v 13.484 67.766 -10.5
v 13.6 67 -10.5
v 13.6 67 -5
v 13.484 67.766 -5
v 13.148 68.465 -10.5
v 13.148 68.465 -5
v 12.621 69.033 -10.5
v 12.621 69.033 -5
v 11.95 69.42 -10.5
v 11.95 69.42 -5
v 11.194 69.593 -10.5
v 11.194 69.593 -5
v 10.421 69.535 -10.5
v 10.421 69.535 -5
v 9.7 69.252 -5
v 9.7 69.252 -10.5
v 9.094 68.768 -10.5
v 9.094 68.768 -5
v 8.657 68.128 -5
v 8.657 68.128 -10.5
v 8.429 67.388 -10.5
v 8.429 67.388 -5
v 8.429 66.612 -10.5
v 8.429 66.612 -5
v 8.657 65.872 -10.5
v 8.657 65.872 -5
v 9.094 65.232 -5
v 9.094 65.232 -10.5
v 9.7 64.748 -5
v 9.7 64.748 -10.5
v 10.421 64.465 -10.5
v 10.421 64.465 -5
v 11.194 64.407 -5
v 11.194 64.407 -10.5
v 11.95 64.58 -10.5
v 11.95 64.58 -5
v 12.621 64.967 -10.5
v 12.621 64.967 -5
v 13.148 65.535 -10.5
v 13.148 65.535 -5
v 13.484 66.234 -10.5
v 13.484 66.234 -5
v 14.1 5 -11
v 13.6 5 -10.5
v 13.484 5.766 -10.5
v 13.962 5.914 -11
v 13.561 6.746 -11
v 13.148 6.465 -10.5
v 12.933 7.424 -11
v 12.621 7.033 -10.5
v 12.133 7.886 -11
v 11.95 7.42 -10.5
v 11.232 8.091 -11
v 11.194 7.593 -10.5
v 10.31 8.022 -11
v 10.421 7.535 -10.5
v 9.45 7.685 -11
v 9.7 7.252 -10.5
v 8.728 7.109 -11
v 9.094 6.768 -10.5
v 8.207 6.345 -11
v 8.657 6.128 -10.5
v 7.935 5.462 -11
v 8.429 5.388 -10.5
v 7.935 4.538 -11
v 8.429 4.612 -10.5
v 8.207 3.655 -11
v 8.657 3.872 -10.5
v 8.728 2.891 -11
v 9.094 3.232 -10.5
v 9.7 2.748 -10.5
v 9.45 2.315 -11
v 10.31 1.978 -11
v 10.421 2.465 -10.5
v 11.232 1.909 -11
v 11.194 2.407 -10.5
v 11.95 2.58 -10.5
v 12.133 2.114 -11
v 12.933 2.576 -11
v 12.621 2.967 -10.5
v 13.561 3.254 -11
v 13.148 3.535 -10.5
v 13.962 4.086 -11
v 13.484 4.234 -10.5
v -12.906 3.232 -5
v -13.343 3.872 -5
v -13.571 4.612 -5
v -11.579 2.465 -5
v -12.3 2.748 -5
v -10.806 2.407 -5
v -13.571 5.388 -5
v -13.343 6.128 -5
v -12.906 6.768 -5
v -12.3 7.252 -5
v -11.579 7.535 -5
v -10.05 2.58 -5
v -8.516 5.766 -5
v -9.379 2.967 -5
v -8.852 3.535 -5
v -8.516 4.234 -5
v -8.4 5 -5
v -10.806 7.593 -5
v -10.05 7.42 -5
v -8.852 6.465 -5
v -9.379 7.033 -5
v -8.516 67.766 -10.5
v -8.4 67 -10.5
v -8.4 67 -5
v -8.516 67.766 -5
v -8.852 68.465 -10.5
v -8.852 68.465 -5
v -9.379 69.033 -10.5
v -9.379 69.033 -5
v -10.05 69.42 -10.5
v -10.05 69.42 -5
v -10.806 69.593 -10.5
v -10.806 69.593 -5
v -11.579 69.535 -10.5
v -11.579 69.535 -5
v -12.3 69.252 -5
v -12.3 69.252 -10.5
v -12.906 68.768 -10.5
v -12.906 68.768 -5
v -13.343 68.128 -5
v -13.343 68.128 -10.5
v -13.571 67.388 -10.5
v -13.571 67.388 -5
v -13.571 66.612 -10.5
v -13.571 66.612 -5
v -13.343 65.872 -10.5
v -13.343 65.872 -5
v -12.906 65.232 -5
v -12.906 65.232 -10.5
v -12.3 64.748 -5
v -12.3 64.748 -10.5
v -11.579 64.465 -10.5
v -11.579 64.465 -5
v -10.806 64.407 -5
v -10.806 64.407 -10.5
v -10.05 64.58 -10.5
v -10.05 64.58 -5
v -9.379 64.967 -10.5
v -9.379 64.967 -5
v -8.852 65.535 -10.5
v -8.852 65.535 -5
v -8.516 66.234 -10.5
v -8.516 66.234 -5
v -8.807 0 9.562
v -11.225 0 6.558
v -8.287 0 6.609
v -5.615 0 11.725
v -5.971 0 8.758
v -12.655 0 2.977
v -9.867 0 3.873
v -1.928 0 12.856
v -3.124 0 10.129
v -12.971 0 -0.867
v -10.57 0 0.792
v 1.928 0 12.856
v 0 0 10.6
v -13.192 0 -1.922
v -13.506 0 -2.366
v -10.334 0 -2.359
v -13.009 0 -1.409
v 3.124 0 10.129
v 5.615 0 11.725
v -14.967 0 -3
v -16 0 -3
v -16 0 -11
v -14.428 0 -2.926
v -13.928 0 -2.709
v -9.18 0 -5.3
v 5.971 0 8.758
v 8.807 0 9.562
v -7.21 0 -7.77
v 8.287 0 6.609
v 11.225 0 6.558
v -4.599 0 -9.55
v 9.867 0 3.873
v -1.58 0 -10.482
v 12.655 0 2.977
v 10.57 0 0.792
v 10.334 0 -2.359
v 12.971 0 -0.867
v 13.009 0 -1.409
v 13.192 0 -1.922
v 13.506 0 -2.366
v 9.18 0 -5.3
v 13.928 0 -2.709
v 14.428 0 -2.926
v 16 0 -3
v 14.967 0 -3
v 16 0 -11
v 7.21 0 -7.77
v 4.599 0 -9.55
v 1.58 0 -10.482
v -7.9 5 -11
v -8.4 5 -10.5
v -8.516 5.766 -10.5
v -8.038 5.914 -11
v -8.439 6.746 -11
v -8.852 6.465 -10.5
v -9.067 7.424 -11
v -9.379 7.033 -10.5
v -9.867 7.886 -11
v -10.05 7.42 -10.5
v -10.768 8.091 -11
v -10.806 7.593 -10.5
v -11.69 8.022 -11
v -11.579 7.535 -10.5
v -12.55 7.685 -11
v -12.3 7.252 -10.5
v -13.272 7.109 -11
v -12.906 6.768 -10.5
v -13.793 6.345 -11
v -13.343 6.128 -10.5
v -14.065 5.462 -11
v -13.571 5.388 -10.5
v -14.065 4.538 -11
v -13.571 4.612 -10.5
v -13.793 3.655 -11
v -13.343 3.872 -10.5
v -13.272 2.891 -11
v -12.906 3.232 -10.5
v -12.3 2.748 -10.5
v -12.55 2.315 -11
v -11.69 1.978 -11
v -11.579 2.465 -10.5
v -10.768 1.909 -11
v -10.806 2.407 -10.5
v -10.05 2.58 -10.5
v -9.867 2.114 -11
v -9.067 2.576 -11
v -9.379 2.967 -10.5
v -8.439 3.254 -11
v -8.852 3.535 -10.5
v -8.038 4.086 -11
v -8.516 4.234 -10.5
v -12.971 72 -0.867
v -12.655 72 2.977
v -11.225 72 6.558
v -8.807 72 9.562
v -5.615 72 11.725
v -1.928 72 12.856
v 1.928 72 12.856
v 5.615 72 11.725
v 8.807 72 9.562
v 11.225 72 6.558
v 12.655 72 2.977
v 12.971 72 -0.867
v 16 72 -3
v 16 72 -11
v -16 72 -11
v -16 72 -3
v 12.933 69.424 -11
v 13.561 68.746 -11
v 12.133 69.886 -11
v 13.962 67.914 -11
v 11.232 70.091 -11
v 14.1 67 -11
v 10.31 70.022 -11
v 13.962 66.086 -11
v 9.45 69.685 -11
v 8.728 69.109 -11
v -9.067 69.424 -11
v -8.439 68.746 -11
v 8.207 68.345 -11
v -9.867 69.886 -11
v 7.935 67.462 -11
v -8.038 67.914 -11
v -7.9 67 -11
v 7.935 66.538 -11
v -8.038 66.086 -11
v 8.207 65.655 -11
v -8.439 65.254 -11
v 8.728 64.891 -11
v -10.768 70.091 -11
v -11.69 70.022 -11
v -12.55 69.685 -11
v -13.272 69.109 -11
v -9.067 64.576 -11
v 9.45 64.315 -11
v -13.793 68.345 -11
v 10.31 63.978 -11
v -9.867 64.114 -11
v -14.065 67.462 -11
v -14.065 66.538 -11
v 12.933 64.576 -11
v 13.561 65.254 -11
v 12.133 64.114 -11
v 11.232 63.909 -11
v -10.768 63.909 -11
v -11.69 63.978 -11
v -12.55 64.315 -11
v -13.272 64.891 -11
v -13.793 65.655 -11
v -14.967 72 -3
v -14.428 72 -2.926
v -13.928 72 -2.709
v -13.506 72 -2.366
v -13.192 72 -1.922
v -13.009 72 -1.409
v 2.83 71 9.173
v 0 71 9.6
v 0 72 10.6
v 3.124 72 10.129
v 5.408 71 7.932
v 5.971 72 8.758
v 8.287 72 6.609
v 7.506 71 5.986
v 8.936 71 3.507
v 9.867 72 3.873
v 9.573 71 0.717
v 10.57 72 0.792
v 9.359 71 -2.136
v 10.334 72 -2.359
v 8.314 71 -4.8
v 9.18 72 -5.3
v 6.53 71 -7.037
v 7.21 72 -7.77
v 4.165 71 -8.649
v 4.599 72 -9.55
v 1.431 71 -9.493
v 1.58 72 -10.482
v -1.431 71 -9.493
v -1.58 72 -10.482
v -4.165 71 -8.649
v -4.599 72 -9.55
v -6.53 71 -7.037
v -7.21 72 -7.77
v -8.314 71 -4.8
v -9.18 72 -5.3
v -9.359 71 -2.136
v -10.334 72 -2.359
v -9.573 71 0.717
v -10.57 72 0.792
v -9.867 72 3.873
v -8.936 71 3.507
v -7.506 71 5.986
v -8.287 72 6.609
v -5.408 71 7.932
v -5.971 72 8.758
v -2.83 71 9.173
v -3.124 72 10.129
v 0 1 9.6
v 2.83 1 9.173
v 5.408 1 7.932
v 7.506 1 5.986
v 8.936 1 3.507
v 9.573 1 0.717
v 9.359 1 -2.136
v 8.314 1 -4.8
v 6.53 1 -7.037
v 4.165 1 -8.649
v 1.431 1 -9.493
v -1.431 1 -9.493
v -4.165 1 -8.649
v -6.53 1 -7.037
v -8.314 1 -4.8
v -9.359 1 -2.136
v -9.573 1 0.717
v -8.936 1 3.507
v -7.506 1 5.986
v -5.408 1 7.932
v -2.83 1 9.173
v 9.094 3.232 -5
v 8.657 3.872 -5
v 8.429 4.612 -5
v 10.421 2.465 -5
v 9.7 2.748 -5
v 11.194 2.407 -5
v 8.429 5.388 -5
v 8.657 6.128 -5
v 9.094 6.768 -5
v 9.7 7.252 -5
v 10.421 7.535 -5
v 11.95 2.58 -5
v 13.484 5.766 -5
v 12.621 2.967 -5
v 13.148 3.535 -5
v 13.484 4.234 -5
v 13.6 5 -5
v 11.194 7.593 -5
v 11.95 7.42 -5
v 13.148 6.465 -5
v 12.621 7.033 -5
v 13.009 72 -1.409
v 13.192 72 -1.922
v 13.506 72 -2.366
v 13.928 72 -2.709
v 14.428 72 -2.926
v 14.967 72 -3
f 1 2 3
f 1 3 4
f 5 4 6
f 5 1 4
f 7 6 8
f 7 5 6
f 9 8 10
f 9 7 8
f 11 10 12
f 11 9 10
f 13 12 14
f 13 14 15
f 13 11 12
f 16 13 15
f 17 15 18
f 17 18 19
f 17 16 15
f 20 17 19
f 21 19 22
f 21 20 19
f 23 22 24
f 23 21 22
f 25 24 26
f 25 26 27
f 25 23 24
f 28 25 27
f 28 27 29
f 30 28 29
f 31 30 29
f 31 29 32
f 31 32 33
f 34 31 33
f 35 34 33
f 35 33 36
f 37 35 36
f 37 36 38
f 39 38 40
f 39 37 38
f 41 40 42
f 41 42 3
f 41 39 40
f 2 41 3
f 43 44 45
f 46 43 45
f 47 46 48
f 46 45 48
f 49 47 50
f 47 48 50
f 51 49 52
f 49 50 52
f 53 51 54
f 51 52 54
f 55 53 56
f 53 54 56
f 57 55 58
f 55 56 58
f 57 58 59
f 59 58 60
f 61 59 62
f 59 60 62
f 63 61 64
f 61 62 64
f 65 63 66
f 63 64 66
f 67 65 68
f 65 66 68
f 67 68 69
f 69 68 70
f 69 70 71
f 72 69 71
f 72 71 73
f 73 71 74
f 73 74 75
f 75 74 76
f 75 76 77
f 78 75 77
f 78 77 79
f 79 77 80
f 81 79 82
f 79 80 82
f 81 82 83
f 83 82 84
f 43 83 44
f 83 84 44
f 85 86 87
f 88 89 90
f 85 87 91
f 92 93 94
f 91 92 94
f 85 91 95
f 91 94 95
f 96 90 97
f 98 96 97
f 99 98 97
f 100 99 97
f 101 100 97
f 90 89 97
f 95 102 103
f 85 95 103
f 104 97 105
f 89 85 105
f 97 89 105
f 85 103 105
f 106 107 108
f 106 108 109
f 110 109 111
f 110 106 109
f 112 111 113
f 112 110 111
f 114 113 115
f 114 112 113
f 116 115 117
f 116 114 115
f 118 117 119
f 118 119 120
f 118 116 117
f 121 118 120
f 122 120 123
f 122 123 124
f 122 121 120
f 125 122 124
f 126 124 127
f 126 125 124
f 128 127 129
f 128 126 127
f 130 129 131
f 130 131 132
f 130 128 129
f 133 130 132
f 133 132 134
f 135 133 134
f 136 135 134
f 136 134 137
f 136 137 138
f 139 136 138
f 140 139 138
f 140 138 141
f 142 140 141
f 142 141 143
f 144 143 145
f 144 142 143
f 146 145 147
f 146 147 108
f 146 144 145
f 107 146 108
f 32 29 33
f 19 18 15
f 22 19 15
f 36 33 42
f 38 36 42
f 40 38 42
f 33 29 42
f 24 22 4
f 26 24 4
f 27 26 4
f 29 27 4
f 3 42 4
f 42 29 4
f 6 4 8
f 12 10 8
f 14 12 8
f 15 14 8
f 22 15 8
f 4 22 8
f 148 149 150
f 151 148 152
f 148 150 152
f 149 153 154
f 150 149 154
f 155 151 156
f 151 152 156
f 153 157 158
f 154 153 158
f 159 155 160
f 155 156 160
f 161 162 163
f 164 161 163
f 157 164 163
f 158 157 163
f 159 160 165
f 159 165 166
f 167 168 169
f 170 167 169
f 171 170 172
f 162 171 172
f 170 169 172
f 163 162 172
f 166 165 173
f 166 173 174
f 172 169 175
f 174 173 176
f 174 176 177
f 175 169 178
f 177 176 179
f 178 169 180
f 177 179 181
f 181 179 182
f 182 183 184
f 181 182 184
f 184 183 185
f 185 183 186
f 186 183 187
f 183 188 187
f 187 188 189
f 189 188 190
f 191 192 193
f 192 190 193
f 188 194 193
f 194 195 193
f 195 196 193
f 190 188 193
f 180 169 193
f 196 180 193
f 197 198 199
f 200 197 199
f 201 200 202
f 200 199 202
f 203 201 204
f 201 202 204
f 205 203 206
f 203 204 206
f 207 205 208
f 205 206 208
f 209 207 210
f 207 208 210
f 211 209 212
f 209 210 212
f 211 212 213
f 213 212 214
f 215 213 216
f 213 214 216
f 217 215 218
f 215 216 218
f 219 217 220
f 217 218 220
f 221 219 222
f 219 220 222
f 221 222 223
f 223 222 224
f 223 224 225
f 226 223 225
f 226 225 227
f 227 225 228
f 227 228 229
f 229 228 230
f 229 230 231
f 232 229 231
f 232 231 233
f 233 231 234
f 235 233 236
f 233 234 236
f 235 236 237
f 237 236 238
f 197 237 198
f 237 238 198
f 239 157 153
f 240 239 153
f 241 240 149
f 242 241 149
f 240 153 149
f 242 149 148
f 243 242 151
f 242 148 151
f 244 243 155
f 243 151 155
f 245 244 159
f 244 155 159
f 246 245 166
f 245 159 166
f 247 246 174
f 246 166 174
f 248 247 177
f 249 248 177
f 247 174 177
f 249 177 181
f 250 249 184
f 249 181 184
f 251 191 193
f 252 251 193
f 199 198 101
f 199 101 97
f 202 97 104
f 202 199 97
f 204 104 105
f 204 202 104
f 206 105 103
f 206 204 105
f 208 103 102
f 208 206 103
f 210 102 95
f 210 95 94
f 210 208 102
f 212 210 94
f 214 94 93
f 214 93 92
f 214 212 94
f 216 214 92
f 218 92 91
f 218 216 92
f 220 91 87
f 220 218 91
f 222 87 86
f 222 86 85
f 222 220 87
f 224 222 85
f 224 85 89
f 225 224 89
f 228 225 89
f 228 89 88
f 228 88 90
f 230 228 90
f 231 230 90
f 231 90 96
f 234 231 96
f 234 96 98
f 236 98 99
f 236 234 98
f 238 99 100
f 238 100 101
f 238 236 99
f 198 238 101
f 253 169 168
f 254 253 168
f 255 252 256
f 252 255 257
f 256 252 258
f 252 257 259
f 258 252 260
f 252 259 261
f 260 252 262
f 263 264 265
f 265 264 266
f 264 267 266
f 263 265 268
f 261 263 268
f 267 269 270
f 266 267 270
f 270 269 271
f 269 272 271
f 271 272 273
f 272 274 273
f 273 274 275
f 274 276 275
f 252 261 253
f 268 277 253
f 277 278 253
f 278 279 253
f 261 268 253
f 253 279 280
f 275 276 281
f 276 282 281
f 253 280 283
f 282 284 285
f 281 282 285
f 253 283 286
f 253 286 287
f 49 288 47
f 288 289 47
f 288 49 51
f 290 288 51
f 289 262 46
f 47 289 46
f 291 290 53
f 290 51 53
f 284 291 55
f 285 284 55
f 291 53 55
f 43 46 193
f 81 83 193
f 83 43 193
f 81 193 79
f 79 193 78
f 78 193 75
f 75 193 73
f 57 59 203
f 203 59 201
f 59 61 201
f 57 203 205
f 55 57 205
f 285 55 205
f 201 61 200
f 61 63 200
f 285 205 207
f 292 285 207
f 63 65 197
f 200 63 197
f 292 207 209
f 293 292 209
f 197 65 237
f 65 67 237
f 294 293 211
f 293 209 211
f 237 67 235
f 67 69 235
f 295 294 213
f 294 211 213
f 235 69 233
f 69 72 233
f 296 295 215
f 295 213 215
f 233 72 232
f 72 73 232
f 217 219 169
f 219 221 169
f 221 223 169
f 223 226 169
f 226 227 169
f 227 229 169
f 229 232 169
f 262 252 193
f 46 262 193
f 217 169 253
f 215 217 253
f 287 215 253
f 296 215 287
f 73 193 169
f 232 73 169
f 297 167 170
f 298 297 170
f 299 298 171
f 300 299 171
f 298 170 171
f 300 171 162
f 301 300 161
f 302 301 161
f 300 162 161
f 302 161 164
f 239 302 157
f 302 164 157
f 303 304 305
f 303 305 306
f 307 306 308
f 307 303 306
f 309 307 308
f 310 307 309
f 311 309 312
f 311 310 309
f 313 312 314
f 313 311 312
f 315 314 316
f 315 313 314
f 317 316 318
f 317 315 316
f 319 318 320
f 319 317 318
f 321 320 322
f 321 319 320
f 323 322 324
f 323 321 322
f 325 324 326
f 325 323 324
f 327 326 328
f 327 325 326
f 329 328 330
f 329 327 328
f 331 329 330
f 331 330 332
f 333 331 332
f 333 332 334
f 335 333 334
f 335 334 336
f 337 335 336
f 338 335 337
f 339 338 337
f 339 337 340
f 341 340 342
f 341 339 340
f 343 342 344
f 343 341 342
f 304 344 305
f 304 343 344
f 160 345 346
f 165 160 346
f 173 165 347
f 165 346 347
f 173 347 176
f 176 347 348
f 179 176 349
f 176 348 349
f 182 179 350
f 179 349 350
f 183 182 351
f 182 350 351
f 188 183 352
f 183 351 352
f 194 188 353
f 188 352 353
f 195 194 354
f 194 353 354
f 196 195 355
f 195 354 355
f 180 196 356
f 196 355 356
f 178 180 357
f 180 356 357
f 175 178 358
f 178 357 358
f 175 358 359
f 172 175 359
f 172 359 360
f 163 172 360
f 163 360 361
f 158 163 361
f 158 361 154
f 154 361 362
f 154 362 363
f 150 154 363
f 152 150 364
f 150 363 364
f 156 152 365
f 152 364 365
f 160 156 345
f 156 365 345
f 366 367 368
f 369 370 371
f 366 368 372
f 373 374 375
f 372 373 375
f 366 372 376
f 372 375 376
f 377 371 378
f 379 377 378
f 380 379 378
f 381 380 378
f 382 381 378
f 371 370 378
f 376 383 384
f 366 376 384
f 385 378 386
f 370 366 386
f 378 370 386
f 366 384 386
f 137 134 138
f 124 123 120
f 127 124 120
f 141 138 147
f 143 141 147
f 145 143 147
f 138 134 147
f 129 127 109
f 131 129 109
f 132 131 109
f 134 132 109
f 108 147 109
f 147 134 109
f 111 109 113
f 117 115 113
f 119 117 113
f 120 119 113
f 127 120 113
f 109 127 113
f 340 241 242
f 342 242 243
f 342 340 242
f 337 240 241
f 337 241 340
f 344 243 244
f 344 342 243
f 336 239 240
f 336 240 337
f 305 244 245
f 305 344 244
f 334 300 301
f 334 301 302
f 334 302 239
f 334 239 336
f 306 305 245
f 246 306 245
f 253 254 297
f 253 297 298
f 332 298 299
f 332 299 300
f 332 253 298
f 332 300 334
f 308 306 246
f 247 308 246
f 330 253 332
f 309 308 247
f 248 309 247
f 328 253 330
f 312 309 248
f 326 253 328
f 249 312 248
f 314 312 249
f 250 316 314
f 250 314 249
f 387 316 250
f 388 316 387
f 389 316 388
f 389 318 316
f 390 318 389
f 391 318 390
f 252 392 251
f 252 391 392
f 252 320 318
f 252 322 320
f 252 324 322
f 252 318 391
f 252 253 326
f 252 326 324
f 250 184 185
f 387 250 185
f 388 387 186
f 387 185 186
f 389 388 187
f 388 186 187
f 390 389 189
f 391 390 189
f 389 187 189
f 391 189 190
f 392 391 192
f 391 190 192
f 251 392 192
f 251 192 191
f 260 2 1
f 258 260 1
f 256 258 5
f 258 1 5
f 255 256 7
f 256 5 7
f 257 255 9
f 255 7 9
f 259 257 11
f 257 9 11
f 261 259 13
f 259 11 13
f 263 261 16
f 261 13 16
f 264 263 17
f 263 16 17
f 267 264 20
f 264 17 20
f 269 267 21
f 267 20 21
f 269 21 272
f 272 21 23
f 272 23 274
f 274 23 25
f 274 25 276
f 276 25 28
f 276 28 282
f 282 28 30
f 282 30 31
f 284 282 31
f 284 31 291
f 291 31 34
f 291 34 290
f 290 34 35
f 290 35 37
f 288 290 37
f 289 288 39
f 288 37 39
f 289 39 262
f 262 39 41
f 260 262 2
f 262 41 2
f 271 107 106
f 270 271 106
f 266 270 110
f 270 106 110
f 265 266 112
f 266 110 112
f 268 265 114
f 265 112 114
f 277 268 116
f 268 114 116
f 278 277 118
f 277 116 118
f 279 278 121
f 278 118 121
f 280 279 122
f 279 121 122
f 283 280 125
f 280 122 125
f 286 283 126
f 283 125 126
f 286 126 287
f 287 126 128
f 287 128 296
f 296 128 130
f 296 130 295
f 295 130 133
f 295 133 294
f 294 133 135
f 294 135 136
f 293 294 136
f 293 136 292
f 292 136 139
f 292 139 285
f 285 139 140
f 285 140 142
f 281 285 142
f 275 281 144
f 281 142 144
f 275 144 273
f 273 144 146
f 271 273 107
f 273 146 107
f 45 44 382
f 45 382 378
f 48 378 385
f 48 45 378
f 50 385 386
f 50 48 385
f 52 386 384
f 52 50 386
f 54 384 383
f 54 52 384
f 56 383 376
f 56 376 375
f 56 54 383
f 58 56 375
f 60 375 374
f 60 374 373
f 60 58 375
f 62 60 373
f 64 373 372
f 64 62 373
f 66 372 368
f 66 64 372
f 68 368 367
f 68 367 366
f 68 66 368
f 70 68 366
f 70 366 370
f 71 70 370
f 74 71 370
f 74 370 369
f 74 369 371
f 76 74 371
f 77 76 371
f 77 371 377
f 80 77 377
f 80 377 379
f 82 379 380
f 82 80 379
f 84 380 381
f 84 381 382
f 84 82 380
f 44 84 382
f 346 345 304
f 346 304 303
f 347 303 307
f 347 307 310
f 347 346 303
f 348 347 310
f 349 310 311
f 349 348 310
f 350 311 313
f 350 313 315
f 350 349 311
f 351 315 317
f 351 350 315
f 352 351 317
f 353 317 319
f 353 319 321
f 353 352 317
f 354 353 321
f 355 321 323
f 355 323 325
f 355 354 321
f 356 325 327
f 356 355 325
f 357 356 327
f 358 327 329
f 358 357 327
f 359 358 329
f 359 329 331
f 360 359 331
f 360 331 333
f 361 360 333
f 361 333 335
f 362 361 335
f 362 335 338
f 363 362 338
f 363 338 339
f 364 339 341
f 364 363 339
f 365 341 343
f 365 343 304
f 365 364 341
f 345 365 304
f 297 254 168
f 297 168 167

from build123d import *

# Parameters (mm, degrees)
SKETCH1_R           = 9.6
BOSS_EXTRUDE1_DEPTH = 72
SKETCH2_R           = 2.6
CUT_EXTRUDE1_DEPTH  = 6
CHAMFER1_SIZE       = 0.5
CHAMFER2_SIZE       = 1


with BuildPart() as part:
    # Sketch1 → Boss-Extrude1 (new body)
    with BuildSketch(Plane(origin=(0, 0, 0), x_dir=(1, 0, 0), z_dir=(0, 1, 0))):
        with BuildLine():
            Line((14.966629547, 3), (16, 3))
            Line((16, 3), (16, 11))
            Line((16, 11), (-16, 11))
            Line((-16, 11), (-16, 3))
            Line((-16, 3), (-14.966629547, 3))
            ThreePointArc((-14.966629547, 3), (-13.50603606, 2.366260102), (-12.971078941, 0.866666667))
            ThreePointArc((-12.971078941, 0.866666667), (0, -13), (12.971078941, 0.866666667))
            ThreePointArc((12.971078941, 0.866666667), (13.50603606, 2.366260102), (14.966629547, 3))
        make_face()
        with Locations(Location((0, 0, 0), (0, 0, 270))):  # turned: the seam where the file's is
            Circle(SKETCH1_R, mode=Mode.SUBTRACT)
    extrude(amount=BOSS_EXTRUDE1_DEPTH)

    # Sketch2 → Cut-Extrude1 (cut)
    with BuildSketch(Plane.XY.offset(-11)):
        with Locations((-11, 67)):
            Circle(SKETCH2_R)
        with Locations((-11, 5)):
            Circle(SKETCH2_R)
        with Locations((11, 67)):
            Circle(SKETCH2_R)
        with Locations((11, 5)):
            Circle(SKETCH2_R)
    extrude(amount=CUT_EXTRUDE1_DEPTH, mode=Mode.SUBTRACT)

    # Chamfer1
    chamfer1_edges = [part.edges().sort_by_distance(p)[0] for p in [
        (-13.6, 67, -11),
        (-13.6, 5, -11),
        (8.4, 67, -11),
        (8.4, 5, -11),
    ]]
    chamfer(chamfer1_edges, length=CHAMFER1_SIZE)

    # Chamfer2
    chamfer2_edges = [part.edges().sort_by_distance(p)[0] for p in [
        (0, 0, -9.6),
        (0, 72, -9.6),
    ]]
    chamfer(chamfer2_edges, length=CHAMFER2_SIZE)


solid = part.part
